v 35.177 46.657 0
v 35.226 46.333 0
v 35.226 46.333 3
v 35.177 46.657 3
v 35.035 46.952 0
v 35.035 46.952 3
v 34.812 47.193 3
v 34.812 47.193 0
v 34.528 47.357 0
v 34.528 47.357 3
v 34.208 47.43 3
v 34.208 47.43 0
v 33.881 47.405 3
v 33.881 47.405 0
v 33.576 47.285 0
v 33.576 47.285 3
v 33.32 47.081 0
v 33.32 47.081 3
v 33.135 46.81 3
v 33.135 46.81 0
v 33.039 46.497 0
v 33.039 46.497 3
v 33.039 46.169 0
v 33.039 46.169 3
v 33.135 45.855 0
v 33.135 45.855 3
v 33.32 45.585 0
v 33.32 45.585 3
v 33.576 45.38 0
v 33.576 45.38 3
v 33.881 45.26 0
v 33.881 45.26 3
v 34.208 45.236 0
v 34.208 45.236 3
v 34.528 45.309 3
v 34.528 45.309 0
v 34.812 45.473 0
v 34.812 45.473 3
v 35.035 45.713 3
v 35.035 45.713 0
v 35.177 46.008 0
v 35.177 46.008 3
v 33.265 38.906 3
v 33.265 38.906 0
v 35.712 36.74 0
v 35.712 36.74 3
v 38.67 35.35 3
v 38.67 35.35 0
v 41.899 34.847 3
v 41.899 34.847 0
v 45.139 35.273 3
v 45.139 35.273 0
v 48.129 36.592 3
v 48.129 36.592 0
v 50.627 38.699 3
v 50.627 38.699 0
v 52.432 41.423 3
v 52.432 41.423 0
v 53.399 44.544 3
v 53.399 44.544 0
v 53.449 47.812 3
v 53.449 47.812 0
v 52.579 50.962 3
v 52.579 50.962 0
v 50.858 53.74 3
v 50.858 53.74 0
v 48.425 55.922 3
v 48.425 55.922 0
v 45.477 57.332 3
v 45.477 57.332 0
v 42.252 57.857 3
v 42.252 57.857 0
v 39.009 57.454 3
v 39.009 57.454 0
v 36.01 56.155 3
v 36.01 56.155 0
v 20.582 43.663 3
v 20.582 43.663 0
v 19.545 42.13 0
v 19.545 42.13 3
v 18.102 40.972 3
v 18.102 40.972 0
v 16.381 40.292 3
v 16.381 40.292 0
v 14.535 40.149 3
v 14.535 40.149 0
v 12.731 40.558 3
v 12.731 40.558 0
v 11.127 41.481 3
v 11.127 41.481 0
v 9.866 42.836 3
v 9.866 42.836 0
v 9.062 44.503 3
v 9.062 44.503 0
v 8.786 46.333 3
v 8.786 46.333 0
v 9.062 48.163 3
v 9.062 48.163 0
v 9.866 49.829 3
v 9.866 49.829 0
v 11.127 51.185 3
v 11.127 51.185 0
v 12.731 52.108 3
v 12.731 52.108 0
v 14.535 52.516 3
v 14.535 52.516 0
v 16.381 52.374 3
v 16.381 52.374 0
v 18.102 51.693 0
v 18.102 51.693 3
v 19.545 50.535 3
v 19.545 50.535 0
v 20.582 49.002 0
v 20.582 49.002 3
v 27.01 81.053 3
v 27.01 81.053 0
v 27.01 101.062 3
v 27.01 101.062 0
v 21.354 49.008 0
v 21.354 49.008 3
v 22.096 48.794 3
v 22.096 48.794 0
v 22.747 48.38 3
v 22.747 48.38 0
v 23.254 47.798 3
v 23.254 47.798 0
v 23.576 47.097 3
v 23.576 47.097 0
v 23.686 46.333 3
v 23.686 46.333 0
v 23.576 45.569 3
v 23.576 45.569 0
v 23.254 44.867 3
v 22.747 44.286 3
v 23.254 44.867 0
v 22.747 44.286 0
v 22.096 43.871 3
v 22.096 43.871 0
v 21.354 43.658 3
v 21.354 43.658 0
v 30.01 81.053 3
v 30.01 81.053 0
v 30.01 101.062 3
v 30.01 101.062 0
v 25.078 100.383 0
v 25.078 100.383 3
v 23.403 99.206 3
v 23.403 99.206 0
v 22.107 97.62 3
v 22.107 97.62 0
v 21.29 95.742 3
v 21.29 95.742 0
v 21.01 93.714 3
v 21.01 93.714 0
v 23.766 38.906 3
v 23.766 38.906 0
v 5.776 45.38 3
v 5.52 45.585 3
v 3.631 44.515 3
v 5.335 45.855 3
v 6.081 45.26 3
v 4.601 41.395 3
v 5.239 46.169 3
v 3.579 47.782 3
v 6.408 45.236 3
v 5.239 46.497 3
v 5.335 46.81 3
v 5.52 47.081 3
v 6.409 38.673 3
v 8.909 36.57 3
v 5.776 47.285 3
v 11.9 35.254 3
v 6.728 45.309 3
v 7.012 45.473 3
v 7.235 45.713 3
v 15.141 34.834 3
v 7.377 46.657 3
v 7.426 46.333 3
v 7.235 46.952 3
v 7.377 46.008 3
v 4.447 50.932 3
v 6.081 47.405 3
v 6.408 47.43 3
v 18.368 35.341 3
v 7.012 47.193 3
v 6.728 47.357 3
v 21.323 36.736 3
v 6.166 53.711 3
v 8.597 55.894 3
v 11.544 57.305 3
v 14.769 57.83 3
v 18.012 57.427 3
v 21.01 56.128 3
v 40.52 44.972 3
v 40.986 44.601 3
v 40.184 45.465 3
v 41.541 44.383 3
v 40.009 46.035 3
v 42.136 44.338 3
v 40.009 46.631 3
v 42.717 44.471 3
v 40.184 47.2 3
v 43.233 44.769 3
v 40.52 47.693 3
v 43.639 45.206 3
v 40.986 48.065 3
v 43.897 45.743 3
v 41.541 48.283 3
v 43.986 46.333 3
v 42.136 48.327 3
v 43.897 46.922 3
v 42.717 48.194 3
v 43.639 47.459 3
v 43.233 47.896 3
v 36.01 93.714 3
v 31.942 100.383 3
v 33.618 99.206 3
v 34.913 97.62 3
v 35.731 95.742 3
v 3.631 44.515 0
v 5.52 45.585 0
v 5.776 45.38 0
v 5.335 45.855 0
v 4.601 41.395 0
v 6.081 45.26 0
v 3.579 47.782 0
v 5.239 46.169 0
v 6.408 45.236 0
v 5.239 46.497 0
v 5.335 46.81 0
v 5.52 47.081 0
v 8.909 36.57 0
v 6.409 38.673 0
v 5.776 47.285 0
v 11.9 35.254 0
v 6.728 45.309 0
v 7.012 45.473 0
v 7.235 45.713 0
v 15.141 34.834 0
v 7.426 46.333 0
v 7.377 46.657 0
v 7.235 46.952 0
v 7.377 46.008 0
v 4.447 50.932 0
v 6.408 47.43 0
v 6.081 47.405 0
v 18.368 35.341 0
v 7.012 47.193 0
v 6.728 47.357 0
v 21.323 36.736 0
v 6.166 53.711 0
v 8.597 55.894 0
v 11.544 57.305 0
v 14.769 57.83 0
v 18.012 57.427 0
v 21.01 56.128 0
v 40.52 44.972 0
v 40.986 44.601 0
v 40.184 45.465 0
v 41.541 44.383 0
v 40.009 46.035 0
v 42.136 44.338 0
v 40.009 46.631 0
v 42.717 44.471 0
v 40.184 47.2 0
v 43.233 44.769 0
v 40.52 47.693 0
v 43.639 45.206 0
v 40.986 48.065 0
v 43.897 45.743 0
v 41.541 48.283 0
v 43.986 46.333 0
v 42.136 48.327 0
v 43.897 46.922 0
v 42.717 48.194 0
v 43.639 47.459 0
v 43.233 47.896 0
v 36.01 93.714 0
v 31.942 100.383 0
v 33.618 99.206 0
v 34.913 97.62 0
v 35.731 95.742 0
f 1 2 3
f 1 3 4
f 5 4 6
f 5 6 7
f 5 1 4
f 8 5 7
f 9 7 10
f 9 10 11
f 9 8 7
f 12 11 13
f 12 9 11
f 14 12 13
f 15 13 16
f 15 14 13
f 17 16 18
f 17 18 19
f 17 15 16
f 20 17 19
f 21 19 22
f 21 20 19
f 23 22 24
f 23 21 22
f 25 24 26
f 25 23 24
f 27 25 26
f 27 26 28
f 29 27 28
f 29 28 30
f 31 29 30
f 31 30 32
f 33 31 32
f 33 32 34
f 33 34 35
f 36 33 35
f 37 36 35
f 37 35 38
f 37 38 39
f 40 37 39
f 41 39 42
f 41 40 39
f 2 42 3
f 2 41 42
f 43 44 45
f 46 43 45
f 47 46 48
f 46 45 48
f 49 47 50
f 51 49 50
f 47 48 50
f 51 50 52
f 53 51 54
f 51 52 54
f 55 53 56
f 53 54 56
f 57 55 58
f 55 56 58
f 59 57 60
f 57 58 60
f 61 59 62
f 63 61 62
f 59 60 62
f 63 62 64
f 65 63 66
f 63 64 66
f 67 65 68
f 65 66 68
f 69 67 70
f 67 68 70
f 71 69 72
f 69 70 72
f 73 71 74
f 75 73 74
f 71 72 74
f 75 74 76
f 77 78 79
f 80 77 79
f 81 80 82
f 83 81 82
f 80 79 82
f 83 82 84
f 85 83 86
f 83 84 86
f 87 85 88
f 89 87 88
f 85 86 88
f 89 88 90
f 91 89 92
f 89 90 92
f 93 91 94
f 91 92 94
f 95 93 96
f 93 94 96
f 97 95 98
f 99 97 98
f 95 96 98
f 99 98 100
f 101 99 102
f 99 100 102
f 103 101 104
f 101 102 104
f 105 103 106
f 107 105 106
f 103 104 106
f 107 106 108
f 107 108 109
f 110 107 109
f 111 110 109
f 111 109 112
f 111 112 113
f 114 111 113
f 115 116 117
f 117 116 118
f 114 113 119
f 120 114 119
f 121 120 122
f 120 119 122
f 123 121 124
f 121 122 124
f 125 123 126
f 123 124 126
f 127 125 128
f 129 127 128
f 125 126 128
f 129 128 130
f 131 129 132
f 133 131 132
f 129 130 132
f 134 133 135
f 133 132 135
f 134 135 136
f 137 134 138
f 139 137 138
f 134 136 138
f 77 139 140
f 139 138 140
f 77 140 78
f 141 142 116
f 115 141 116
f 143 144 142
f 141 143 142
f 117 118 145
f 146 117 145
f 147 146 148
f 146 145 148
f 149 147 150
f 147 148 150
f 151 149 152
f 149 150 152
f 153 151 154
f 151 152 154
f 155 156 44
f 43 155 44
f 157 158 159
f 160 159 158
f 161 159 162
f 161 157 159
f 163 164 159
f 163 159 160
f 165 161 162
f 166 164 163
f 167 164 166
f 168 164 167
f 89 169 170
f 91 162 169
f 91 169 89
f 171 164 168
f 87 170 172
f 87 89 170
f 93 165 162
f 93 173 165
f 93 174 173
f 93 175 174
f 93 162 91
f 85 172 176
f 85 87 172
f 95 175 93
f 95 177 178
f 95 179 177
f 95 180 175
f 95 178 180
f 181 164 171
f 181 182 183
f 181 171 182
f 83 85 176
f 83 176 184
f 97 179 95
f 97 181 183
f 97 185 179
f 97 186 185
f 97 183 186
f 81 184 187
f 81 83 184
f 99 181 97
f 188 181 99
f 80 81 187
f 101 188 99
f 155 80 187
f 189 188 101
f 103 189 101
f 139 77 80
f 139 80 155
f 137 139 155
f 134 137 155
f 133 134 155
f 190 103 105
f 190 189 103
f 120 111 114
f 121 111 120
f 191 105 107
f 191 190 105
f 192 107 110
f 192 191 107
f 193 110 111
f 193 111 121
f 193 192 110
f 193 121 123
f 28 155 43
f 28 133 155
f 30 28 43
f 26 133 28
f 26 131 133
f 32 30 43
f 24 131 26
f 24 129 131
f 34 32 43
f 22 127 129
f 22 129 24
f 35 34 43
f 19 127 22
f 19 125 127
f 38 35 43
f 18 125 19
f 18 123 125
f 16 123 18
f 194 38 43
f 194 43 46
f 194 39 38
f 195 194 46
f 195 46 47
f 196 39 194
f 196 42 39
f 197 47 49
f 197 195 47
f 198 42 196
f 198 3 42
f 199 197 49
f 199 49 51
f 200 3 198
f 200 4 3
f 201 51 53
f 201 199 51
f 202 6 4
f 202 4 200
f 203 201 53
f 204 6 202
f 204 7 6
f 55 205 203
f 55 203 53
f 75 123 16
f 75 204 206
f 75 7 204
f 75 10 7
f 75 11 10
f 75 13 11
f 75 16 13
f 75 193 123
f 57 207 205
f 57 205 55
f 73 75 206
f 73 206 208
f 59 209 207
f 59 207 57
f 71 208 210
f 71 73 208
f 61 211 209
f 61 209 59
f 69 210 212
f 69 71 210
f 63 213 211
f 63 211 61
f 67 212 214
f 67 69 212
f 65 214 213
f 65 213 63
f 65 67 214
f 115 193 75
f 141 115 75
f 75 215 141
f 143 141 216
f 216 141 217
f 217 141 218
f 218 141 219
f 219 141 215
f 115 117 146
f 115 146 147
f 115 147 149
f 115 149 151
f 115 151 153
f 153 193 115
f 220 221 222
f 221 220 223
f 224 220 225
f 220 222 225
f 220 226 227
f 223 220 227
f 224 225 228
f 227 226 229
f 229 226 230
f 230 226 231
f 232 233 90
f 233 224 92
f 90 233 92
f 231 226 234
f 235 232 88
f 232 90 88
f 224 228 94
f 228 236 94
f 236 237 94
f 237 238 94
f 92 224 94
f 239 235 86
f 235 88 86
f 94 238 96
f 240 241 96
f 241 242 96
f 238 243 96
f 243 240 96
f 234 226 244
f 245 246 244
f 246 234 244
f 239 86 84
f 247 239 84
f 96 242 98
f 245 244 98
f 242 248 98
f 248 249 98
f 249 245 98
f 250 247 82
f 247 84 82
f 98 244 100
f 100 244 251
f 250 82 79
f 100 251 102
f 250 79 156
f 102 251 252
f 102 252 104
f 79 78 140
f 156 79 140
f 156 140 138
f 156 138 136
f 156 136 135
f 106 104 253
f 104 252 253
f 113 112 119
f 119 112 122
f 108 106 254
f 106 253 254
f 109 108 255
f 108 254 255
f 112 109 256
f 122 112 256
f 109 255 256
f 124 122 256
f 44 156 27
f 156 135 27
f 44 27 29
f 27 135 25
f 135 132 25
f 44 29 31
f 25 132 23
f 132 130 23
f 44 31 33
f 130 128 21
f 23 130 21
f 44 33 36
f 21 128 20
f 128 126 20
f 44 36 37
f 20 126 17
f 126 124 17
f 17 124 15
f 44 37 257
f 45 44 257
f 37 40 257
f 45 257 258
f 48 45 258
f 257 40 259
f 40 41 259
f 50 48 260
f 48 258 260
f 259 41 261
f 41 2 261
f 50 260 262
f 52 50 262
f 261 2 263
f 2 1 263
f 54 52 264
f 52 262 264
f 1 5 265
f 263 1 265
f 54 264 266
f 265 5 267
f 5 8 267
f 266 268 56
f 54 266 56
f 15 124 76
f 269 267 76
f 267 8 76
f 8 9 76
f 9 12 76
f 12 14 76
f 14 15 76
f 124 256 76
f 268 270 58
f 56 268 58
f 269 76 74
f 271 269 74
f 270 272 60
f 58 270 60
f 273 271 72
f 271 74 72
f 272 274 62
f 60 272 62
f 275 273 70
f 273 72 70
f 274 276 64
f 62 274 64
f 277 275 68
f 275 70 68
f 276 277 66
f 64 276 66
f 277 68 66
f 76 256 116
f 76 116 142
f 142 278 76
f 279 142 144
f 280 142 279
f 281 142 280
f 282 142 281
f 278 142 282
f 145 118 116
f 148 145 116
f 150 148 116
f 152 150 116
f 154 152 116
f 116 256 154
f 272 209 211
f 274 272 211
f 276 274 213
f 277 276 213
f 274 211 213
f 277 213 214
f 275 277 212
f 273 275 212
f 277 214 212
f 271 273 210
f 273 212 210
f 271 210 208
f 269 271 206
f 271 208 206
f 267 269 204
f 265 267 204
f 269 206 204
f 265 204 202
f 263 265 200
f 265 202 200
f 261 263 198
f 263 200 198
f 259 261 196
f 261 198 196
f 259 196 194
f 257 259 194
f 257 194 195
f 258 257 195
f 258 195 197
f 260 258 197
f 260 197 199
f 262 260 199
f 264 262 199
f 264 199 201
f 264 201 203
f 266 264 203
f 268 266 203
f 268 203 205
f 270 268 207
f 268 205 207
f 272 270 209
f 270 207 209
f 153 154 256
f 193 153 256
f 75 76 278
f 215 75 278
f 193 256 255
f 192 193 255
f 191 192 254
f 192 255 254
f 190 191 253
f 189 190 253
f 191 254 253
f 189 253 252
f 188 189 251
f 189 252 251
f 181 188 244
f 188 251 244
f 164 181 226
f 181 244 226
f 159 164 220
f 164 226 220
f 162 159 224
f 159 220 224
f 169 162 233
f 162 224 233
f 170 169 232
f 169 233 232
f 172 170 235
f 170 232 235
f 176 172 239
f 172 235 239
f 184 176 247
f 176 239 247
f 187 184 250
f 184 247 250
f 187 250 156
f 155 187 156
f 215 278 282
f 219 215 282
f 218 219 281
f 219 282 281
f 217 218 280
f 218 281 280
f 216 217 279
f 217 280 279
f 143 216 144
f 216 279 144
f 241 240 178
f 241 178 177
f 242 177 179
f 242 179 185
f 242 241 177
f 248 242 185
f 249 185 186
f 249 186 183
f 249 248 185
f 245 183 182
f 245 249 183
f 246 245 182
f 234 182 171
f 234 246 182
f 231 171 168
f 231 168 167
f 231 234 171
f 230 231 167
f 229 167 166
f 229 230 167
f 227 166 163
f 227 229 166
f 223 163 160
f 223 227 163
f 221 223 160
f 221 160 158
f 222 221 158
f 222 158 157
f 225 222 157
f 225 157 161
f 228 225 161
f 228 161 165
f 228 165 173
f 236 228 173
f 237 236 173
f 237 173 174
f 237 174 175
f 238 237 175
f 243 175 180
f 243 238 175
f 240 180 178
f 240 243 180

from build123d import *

# Parameters (mm, degrees)
SKETCH3_R           = 1.1
BOSS_EXTRUDE1_DEPTH = 3
SKETCH5_R           = 2
CUT_EXTRUDE1_DEPTH  = 3


with BuildPart() as part:
    # Sketch3 → Boss-Extrude1 (new body)
    with BuildSketch(Plane.XY):
        with BuildLine():
            ThreePointArc((21.010133, 56.127810971), (3.63133679, 44.514906989), (23.766391, 38.905835))
            Line((23.766391, 38.905835), (33.206061, 38.905835))
            Line((33.206061, 38.905835), (33.264681316, 38.905835))
            ThreePointArc((33.264681316, 38.905835), (53.399016999, 44.544189703), (36.010134, 56.154928922))
            Line((36.010134, 56.154928922), (36.010134, 56.158016))
            Line((36.010134, 56.158016), (36.010134, 93.713691502))
            ThreePointArc((36.010134, 93.713691502), (34.319609023, 98.457108027), (30.010134, 101.062160821))
            Line((30.010134, 101.062160821), (30.010134, 101.052906355))
            Line((30.010134, 101.052906355), (30.010134, 81.052906536))
            Line((30.010134, 81.052906536), (27.010134, 81.052906536))
            Line((27.010134, 81.052906536), (27.010134, 101.052906536))
            Line((27.010134, 101.052906536), (27.010134, 101.062160866))
            ThreePointArc((27.010134, 101.062160866), (22.700658897, 98.4571082), (21.010133, 93.713692))
            Line((21.010133, 93.713692), (21.010133, 56.128782))
            Line((21.010133, 56.128782), (21.010133, 56.127810971))
        make_face()
        with Locations((6.326226, 46.332725)):
            Circle(SKETCH3_R, mode=Mode.SUBTRACT)
        with BuildLine():
            ThreePointArc((20.582059495, 43.663146925), (8.78622584, 46.332725409), (20.582059481, 49.002303953))
            ThreePointArc((20.582059481, 49.002303953), (23.686226, 46.332725447), (20.582059495, 43.663146925))
        make_face(mode=Mode.SUBTRACT)
        with Locations((34.126226, 46.332725)):
            Circle(SKETCH3_R, mode=Mode.SUBTRACT)
    extrude(amount=BOSS_EXTRUDE1_DEPTH)

    # Sketch5 → Cut-Extrude1 (cut)
    with BuildSketch(Plane.XY.offset(3)):
        with Locations((41.986225603, 46.332725741)):
            Circle(SKETCH5_R)
    extrude(amount=-CUT_EXTRUDE1_DEPTH, mode=Mode.SUBTRACT)


solid = part.part
